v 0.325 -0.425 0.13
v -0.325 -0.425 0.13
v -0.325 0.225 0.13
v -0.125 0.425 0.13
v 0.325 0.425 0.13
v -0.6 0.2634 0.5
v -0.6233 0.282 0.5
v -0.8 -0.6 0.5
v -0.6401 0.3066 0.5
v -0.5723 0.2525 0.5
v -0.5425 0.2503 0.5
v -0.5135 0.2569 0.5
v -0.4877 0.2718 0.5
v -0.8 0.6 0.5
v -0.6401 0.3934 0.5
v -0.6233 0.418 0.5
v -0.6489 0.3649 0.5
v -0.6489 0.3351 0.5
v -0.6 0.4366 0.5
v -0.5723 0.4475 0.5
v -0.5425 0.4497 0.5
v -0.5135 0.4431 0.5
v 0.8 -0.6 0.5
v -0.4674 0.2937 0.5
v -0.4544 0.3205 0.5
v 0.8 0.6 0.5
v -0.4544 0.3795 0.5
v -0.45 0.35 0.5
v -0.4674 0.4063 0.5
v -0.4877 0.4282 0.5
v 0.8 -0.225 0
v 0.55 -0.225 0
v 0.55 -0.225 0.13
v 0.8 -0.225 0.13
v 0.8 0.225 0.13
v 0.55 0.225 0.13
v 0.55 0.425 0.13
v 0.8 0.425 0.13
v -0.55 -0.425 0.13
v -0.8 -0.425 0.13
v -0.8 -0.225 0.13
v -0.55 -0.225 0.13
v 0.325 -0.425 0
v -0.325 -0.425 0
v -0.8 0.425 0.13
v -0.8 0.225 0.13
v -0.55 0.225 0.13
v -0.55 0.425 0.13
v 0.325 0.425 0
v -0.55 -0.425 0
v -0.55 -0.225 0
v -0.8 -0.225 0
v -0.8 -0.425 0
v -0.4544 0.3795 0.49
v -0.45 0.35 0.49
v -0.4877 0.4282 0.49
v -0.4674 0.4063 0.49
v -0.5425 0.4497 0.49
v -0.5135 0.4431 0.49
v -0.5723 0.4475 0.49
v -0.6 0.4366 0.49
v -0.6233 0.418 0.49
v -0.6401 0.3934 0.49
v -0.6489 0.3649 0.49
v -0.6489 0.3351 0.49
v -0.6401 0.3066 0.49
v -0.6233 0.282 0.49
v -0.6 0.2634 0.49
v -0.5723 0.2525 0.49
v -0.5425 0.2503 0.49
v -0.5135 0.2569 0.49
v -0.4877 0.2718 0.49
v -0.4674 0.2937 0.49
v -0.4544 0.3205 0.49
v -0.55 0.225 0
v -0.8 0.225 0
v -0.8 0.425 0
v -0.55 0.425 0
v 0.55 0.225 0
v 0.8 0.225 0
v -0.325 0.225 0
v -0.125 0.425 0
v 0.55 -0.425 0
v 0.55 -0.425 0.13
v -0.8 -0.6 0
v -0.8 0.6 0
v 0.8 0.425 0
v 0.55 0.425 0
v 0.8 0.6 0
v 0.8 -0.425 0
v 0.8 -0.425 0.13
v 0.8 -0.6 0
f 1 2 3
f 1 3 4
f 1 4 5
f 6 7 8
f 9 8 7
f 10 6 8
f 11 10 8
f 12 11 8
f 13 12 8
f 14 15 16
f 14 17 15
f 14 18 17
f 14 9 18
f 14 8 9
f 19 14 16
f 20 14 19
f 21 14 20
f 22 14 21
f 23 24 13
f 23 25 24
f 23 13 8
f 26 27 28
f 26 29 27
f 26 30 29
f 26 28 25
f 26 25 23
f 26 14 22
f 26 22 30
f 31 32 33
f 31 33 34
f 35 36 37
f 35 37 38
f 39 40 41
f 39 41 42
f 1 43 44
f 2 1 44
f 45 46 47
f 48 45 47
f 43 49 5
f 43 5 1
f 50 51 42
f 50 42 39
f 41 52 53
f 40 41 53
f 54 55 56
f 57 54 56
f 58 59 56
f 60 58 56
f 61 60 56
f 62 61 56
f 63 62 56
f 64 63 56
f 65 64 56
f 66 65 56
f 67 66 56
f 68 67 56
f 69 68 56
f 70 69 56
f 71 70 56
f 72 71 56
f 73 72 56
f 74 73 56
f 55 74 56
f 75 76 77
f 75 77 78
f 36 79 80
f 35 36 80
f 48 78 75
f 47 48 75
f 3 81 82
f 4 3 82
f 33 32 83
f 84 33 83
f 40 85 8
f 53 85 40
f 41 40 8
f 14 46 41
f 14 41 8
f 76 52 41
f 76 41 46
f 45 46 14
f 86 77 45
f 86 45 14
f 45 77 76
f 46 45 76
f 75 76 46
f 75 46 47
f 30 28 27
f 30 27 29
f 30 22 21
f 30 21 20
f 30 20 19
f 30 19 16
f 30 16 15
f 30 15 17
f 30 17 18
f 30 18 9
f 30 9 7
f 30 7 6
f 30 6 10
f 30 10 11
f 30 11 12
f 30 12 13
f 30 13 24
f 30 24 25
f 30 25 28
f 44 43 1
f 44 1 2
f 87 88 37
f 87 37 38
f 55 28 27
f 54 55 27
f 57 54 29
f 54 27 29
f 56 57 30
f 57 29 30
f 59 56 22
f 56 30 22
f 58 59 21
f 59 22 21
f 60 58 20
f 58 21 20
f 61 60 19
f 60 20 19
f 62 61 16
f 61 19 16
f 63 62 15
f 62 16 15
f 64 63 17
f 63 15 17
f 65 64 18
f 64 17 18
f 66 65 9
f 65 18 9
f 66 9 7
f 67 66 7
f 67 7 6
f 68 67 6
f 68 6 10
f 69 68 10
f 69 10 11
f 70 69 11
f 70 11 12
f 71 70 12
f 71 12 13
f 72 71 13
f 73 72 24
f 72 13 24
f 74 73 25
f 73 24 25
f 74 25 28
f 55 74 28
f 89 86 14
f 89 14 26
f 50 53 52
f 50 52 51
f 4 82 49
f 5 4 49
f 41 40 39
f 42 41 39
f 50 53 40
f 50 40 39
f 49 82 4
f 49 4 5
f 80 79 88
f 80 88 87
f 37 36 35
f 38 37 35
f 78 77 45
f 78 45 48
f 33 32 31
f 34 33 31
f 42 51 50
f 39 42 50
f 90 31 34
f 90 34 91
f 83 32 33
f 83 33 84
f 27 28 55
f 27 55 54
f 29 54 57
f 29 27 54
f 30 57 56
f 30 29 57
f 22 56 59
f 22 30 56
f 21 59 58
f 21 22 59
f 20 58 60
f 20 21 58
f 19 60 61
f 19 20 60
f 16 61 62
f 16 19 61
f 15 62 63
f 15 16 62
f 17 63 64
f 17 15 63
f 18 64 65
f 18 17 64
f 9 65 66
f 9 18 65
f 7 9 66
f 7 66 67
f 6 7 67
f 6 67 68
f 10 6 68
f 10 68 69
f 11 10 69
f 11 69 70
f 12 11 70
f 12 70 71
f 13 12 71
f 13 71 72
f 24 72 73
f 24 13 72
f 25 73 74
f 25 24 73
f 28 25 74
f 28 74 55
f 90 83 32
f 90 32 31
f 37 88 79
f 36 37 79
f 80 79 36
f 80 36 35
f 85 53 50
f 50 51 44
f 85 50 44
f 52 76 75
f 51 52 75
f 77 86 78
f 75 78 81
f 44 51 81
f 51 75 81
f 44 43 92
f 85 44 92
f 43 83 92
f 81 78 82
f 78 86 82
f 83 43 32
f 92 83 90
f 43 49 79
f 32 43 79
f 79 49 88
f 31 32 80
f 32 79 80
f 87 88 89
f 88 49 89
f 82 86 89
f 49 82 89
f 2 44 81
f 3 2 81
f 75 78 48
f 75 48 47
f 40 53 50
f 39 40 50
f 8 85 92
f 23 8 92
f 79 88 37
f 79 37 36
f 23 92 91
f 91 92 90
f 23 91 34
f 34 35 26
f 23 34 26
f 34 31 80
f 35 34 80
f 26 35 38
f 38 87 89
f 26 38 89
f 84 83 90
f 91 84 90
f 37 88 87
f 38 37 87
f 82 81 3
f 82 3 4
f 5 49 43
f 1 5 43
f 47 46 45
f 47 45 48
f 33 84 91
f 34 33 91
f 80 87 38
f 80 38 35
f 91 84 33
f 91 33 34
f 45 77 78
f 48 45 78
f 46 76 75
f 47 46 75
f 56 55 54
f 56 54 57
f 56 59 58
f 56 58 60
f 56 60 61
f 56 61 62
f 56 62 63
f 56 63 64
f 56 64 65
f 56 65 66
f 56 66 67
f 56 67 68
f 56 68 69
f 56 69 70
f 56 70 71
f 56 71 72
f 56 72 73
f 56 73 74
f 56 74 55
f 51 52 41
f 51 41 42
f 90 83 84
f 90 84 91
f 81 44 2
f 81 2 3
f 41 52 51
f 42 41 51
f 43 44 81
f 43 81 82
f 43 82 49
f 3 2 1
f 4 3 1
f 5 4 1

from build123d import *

# Parameters (mm, degrees)
F0_W     = 1.6
F0_H     = 1.2
F1_DEPTH = 0.5
F2_W     = 0.25
F2_H     = 0.2
F3_DEPTH = 0.13
F5_R     = 0.1
F6_DEPTH = 0.01


with BuildPart() as f1:
    # F0 (on Top) → F1 (new body)
    with BuildSketch(Plane.XY):
        Rectangle(F0_W, F0_H)
    extrude(amount=F1_DEPTH)


with BuildPart() as f3:
    # F2 (on face) → F3 (new body)
    with BuildSketch(Plane(origin=(0, 0, 0), x_dir=(1, 0, 0), z_dir=(0, 0, -1))):
        with Locations((-0.675, 0.325)):
            Rectangle(F2_W, F2_H)
        with Locations((-0.675, -0.325)):
            Rectangle(F2_W, F2_H)
        with Locations((0.675, 0.325)):
            Rectangle(F2_W, F2_H)
        with Locations((0.675, -0.325)):
            Rectangle(F2_W, F2_H)
        Polygon((0.325, 0.425), (-0.325, 0.425), (-0.325, -0.225), (-0.125, -0.425), (0.325, -0.425), align=None)
    extrude(amount=-F3_DEPTH)


with BuildPart() as f1_1:
    add(f1.part)

    # F4: cut F3
    add(f3.part, mode=Mode.SUBTRACT)


with BuildPart() as f6:
    # F5 (on face) → F6 (new body)
    with BuildSketch(Plane.XY.offset(0.5)):
        with Locations((-0.55, 0.35)):
            Circle(F5_R)
    extrude(amount=-F6_DEPTH)


with BuildPart() as f1_2:
    add(f1_1.part)

    # F7: cut F6
    add(f6.part, mode=Mode.SUBTRACT)


solid = Compound([f3.part, f6.part, f1_2.part])
